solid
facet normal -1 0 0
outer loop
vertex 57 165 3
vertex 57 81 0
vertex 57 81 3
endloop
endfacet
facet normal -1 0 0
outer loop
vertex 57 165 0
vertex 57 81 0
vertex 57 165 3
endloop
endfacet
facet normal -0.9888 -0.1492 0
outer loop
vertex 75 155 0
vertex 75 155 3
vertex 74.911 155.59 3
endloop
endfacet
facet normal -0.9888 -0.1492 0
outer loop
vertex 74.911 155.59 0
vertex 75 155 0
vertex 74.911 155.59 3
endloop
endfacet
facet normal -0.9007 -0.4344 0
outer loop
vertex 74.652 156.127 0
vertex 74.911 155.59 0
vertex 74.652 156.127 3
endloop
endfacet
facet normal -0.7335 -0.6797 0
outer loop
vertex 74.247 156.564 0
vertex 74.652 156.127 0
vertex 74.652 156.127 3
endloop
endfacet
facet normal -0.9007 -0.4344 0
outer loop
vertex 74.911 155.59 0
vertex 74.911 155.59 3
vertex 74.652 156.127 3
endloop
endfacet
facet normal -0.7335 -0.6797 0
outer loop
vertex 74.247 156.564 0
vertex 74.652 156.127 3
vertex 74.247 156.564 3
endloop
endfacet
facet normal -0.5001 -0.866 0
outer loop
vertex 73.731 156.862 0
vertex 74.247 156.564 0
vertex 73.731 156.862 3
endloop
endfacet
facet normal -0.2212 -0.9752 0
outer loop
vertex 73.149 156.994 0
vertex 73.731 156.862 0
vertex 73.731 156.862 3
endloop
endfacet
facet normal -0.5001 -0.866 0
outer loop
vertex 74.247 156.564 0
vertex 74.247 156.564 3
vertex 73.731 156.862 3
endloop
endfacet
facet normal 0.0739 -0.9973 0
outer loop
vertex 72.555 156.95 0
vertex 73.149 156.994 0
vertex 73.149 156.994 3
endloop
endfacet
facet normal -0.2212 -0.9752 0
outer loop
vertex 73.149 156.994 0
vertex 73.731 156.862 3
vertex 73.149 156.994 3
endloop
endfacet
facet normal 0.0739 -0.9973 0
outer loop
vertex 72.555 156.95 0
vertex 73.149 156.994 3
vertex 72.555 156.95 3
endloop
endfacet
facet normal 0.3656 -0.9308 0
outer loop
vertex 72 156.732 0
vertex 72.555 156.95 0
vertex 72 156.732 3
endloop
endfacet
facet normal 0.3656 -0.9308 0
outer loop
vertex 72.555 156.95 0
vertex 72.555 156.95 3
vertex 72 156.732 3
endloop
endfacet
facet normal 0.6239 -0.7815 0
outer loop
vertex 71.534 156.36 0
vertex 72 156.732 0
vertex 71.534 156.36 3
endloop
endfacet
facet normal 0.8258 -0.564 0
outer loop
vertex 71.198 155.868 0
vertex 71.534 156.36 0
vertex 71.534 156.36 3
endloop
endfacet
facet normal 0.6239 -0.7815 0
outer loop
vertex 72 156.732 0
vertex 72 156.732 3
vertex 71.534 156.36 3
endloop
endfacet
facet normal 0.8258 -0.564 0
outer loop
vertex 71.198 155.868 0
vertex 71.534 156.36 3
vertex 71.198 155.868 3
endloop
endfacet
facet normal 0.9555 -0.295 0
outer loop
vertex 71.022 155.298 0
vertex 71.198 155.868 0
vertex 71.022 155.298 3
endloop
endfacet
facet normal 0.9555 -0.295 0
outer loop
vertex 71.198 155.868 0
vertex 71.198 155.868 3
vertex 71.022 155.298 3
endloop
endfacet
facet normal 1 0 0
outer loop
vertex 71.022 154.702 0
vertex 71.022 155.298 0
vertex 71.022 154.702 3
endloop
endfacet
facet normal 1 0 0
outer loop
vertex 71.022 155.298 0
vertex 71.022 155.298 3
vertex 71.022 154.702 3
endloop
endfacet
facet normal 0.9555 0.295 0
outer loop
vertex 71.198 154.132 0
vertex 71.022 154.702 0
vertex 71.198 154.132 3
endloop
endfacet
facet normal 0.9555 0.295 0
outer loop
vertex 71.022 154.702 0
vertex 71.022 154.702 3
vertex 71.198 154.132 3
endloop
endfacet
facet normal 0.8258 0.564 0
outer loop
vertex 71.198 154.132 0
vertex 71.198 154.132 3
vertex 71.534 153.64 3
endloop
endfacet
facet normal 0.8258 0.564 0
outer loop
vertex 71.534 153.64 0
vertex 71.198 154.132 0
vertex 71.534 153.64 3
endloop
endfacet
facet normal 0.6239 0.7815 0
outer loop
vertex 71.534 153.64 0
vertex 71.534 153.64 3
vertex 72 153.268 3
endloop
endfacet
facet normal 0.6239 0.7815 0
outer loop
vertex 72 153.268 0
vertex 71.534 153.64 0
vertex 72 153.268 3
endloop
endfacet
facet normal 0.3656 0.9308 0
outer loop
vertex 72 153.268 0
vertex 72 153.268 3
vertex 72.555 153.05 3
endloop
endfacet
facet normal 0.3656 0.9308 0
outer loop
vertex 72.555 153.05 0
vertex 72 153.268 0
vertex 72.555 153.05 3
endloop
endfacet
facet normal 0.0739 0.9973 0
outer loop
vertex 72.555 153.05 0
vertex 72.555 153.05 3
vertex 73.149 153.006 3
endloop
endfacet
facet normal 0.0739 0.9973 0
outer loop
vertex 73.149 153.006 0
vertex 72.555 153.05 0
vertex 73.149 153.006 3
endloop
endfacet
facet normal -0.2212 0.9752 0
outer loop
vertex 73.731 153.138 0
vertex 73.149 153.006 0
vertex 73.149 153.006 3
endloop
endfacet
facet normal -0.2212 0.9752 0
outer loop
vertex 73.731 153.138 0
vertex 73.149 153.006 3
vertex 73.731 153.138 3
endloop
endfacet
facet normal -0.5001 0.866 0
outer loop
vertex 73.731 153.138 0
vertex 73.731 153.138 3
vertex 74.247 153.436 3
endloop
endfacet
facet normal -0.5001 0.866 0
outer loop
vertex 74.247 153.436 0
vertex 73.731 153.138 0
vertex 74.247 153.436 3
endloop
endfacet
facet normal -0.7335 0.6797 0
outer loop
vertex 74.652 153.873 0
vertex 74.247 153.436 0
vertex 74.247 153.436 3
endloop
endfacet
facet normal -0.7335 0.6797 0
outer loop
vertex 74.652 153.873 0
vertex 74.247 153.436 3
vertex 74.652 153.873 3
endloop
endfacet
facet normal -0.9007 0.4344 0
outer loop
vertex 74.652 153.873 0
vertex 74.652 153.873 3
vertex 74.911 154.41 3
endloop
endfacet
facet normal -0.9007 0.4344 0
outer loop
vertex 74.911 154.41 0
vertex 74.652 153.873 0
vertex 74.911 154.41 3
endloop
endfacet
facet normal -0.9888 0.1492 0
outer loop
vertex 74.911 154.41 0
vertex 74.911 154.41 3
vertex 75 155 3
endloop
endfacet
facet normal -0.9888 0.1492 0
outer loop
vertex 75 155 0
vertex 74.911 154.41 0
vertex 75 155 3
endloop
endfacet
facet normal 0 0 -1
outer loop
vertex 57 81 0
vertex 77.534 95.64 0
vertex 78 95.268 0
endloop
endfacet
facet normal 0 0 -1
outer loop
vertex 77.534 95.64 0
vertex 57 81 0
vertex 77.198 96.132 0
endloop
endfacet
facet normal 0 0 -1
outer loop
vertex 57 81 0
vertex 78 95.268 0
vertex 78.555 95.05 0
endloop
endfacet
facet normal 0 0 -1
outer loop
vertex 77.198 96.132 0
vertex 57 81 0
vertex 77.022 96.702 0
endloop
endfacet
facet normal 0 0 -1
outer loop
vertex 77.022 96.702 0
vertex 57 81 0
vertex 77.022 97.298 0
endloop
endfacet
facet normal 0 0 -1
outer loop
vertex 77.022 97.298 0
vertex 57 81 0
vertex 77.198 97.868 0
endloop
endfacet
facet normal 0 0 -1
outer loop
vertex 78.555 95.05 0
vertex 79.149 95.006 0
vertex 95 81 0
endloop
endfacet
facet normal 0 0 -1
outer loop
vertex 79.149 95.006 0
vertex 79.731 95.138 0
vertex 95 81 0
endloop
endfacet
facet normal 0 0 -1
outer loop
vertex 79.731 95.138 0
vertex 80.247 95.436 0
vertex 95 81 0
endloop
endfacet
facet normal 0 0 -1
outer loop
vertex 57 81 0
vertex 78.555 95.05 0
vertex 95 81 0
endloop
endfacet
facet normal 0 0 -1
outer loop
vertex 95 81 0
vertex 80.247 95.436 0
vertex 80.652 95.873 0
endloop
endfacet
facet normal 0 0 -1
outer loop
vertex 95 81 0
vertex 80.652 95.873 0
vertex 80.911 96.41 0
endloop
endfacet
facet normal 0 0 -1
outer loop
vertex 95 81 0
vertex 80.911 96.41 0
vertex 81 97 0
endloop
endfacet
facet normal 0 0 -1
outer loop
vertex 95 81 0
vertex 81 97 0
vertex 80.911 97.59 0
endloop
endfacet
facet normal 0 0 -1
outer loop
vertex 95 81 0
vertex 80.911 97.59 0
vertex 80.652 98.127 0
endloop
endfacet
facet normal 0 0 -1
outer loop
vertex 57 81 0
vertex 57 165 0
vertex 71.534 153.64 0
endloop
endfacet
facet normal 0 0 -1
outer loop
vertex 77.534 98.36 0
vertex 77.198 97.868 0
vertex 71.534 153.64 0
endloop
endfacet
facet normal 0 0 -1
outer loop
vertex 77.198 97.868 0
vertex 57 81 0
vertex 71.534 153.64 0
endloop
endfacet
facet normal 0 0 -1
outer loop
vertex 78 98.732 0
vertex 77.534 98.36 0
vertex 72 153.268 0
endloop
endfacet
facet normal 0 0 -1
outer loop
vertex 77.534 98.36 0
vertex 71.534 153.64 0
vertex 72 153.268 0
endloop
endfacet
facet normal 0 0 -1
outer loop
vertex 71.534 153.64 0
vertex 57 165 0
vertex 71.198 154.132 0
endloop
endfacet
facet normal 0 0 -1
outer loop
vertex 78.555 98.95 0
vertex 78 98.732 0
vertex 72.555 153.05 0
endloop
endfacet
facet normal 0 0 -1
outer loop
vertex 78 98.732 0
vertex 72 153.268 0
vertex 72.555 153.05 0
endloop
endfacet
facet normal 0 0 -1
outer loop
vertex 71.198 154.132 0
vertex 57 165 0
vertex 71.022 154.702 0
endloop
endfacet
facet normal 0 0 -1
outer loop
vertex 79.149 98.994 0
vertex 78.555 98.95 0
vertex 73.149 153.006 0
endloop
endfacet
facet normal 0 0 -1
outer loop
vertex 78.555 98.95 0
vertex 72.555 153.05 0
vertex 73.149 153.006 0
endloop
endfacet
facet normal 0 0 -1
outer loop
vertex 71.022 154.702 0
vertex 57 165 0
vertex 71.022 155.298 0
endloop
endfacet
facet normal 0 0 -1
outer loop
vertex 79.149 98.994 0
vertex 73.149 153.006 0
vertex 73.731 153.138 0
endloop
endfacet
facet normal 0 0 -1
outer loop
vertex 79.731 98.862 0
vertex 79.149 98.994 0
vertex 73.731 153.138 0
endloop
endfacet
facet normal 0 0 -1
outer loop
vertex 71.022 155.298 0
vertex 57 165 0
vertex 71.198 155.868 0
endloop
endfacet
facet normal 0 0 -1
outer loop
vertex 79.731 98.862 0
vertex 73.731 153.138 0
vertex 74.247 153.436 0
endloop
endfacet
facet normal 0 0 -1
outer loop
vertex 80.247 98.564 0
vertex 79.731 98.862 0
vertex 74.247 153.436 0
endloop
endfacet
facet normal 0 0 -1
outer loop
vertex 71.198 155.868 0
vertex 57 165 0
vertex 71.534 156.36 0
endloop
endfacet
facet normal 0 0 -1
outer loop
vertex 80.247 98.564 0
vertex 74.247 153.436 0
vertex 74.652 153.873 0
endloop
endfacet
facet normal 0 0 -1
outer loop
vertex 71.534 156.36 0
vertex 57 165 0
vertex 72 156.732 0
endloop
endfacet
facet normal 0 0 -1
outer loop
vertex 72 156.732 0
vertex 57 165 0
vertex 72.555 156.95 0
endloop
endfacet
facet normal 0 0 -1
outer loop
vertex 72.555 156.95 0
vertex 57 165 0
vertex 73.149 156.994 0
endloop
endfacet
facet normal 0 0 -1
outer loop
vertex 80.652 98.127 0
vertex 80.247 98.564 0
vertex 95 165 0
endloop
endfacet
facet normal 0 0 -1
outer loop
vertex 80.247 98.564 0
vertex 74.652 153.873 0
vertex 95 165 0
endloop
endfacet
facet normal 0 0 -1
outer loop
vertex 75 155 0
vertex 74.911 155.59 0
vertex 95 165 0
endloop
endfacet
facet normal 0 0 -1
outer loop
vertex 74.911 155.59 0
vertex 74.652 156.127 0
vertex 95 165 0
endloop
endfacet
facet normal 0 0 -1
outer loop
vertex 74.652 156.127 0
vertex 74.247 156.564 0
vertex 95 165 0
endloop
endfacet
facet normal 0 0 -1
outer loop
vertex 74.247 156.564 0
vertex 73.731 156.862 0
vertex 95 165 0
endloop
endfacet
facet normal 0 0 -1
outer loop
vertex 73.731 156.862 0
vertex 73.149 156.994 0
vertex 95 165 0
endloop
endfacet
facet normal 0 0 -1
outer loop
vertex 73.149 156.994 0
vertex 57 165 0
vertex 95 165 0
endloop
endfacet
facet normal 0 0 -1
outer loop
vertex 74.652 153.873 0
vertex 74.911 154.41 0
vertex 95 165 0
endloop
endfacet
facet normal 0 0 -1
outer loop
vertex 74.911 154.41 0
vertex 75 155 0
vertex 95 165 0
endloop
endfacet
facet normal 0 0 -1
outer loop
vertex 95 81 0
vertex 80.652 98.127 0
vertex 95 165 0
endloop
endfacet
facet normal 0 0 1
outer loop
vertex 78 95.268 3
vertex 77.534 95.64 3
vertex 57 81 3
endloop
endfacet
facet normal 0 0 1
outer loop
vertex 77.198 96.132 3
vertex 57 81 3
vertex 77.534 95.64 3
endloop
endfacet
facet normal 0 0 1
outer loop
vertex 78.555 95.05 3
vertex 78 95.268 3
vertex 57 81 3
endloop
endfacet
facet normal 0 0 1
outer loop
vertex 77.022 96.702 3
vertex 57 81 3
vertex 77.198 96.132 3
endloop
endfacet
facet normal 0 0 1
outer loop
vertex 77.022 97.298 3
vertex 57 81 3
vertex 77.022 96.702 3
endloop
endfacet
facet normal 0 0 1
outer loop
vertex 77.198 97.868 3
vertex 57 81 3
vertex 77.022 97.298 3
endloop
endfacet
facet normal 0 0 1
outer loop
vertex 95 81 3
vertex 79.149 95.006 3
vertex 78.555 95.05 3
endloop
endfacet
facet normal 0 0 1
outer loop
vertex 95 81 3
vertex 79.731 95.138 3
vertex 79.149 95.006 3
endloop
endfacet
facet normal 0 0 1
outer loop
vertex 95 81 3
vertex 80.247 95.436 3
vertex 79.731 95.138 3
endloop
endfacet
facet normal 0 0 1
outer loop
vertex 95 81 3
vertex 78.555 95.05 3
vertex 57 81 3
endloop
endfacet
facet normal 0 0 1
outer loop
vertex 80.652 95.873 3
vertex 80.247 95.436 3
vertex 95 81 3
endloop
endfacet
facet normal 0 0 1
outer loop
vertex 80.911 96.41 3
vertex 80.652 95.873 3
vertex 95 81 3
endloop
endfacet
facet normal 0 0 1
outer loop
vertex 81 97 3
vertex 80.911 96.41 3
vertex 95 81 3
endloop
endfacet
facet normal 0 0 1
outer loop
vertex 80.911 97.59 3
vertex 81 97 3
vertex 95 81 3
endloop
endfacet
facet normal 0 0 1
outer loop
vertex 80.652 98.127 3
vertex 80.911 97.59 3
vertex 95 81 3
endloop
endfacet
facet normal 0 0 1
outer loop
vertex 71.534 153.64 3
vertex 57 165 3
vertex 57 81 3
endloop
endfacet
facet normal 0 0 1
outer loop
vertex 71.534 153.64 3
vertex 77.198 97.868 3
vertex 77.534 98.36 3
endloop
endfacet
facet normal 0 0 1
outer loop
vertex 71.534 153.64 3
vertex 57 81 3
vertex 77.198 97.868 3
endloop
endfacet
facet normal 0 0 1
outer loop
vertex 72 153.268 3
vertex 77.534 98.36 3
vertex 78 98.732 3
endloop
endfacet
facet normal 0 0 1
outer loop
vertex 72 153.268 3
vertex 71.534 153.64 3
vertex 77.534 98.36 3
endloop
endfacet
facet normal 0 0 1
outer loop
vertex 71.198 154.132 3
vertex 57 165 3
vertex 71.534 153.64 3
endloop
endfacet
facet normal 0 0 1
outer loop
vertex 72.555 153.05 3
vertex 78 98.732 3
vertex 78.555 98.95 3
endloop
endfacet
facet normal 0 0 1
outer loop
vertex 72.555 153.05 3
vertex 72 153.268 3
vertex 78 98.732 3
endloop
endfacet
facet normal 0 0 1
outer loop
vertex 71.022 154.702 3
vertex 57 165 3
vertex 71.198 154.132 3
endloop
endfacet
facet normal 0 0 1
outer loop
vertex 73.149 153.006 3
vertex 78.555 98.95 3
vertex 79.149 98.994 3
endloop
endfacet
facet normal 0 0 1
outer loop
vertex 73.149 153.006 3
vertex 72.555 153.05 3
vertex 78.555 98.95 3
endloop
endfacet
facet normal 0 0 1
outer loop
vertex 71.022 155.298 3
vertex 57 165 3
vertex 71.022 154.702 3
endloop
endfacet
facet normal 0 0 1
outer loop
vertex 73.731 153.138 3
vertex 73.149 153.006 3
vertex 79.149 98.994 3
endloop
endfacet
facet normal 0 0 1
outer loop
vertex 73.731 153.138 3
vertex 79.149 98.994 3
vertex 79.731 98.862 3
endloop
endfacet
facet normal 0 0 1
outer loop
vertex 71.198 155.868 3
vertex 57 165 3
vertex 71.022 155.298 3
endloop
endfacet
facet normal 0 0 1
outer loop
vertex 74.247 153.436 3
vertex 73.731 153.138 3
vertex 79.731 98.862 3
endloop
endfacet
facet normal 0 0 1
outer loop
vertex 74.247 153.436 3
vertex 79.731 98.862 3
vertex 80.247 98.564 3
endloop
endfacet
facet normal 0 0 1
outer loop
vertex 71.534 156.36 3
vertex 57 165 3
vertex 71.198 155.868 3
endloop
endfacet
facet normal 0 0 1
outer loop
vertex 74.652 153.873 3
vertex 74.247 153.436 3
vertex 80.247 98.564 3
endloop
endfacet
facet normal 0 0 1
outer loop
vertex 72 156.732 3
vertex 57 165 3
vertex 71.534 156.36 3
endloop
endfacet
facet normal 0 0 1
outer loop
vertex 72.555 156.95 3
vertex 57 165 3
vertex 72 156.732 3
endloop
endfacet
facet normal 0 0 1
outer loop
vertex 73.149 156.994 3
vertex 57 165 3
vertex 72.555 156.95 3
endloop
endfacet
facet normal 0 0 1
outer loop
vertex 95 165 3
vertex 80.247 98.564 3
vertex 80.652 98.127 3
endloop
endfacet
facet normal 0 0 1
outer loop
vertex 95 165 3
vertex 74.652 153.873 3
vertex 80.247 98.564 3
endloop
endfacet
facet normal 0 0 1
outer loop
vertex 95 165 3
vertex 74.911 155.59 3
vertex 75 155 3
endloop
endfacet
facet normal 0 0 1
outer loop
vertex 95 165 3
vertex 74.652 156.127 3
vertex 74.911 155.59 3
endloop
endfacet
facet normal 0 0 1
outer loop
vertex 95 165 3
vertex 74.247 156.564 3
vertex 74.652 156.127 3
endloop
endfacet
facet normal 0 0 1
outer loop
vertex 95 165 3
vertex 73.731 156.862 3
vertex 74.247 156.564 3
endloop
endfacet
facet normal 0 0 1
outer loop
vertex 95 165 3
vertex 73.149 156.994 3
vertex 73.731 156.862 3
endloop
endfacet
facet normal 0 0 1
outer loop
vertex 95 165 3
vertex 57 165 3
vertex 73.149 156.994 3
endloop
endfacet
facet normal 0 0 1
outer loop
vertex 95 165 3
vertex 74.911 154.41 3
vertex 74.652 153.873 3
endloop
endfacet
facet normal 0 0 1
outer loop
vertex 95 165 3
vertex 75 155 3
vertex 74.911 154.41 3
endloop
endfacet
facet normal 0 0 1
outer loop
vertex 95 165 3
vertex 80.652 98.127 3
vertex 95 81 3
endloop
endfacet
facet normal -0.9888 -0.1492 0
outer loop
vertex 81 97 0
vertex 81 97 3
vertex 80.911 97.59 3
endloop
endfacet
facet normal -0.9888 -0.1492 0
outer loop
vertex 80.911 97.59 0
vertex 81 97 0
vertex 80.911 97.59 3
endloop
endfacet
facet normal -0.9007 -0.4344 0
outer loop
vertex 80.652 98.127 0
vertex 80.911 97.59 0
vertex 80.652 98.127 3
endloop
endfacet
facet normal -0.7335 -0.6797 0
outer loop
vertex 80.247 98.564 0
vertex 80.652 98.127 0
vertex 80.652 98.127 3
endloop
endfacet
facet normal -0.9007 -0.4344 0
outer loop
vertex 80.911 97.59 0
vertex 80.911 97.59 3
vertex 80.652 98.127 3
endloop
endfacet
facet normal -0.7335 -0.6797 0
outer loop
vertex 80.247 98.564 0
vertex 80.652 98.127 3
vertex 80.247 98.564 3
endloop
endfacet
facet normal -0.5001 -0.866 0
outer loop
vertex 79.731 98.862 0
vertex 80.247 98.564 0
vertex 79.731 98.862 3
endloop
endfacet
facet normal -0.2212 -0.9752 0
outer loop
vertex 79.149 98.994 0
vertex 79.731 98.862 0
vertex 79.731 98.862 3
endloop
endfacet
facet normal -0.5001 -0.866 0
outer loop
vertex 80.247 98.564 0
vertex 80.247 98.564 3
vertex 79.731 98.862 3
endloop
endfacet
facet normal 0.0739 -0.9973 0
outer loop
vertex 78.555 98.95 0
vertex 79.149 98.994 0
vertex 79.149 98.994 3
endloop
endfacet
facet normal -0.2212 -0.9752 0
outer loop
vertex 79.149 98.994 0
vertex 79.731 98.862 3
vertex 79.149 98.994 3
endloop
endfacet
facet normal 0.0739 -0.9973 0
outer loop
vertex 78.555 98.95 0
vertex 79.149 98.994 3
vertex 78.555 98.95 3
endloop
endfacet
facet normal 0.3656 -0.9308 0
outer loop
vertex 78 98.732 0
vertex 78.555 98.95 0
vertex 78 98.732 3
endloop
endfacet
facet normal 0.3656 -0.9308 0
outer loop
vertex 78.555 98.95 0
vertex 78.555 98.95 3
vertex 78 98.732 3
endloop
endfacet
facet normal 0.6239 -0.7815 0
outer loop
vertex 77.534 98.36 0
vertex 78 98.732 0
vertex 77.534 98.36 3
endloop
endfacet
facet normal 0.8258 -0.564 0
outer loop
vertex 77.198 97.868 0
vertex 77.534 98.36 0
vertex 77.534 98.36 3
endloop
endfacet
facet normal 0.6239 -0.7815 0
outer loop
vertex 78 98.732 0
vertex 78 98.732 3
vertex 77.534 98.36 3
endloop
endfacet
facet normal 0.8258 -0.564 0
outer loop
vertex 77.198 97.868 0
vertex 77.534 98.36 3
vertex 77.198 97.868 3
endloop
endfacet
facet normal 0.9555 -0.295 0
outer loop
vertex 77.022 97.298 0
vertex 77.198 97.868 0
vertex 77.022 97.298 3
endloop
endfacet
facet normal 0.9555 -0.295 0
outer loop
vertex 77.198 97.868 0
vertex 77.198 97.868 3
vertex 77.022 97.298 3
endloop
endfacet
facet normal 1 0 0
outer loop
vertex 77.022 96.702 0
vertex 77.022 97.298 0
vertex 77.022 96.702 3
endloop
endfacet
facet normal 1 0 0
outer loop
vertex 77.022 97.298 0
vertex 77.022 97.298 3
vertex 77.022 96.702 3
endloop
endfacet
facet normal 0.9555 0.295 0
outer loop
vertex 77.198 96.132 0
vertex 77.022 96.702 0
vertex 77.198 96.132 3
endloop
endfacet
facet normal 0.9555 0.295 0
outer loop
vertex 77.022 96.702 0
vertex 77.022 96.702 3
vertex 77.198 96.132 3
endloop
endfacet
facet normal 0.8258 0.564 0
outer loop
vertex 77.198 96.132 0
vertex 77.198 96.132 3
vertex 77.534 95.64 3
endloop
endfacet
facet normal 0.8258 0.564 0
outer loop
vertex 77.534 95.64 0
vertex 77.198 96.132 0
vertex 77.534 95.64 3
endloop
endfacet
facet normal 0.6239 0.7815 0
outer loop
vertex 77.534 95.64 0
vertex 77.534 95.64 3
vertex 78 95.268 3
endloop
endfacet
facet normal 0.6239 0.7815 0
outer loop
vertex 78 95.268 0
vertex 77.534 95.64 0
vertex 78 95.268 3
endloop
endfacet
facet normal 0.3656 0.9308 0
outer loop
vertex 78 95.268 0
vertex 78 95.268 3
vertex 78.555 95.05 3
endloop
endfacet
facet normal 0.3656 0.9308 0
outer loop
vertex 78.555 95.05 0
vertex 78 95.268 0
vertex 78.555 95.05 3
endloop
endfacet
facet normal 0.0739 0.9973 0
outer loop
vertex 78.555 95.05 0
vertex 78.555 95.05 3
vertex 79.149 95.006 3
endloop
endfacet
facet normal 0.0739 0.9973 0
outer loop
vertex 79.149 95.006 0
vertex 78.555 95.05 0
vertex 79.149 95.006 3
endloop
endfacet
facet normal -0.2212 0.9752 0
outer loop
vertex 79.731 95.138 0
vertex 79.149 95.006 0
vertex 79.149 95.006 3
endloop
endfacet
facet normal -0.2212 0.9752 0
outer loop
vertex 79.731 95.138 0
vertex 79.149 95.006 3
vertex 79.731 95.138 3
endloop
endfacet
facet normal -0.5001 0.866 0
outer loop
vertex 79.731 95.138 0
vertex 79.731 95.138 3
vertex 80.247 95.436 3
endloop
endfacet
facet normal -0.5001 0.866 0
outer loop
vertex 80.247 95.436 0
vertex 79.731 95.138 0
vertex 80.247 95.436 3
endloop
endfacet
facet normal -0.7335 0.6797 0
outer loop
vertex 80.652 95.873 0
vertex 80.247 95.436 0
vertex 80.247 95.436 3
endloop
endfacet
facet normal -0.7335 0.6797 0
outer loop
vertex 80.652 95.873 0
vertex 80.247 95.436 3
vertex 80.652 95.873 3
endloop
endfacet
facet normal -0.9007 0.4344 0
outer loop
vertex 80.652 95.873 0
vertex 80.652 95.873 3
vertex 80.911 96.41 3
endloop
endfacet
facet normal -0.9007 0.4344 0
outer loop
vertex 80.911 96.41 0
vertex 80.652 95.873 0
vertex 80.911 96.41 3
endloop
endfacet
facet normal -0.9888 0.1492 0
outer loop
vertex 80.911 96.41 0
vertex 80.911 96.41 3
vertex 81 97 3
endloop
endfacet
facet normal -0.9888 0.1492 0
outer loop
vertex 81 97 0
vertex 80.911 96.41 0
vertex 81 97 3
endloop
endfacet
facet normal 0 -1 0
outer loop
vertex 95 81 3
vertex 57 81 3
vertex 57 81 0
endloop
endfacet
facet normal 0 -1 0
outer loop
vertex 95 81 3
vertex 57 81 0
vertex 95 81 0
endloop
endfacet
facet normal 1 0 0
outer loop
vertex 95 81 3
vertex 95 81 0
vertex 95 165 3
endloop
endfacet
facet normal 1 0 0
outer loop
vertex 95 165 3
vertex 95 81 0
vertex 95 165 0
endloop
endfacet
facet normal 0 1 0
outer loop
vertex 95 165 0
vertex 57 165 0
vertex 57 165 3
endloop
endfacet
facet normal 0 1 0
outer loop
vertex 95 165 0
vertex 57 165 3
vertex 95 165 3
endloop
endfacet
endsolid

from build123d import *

# Parameters (mm, degrees)
ESQUISSE1_W             = 38
ESQUISSE1_H             = 320
BOSS_EXTRU_1_DEPTH      = 3
ENL_V_MAT_EXTRU_1_REACH = 192.418
ESQUISSE2_R             = 2
ENL_V_MAT_EXTRU_2_REACH = 192.418
ESQUISSE3_W             = 38
ESQUISSE3_H             = 236


with BuildPart() as part:
    # Esquisse1 → Boss.-Extru.1 (new body)
    with BuildSketch(Plane.XY):
        with Locations((76, 5)):
            Rectangle(ESQUISSE1_W, ESQUISSE1_H)
    extrude(amount=BOSS_EXTRU_1_DEPTH)

    # Esquisse2 → Enlèv. mat.-Extru.1 (cut, up to next)
    with BuildSketch(Plane.XY.offset(3), mode=Mode.PRIVATE) as enl_v_mat_extru_1_sk1:
        with Locations((73, 155)):
            Circle(ESQUISSE2_R)
    enl_v_mat_extru_1_tool1 = extrude(enl_v_mat_extru_1_sk1.sketch, amount=-ENL_V_MAT_EXTRU_1_REACH, mode=Mode.PRIVATE) & part.part
    # Esquisse2 → Enlèv. mat.-Extru.1 (cut, up to next)
    with BuildSketch(Plane.XY.offset(3), mode=Mode.PRIVATE) as enl_v_mat_extru_1_sk2:
        with Locations((79, 97)):
            Circle(ESQUISSE2_R)
    enl_v_mat_extru_1_tool2 = extrude(enl_v_mat_extru_1_sk2.sketch, amount=-ENL_V_MAT_EXTRU_1_REACH, mode=Mode.PRIVATE) & part.part
    add(enl_v_mat_extru_1_tool1.solids().sort_by_distance((73, 155, 3))[0], mode=Mode.SUBTRACT)
    add(enl_v_mat_extru_1_tool2.solids().sort_by_distance((79, 97, 3))[0], mode=Mode.SUBTRACT)

    # Esquisse3 → Enlèv. mat.-Extru.2 (cut, up to next)
    with BuildSketch(Plane.XY.offset(3), mode=Mode.PRIVATE) as enl_v_mat_extru_2_sk1:
        with Locations((76, -37)):
            Rectangle(ESQUISSE3_W, ESQUISSE3_H)
    enl_v_mat_extru_2_tool1 = extrude(enl_v_mat_extru_2_sk1.sketch, amount=-ENL_V_MAT_EXTRU_2_REACH, mode=Mode.PRIVATE) & part.part
    add(enl_v_mat_extru_2_tool1.solids().sort_by_distance((76, -37, 3))[0], mode=Mode.SUBTRACT)


solid = part.part
